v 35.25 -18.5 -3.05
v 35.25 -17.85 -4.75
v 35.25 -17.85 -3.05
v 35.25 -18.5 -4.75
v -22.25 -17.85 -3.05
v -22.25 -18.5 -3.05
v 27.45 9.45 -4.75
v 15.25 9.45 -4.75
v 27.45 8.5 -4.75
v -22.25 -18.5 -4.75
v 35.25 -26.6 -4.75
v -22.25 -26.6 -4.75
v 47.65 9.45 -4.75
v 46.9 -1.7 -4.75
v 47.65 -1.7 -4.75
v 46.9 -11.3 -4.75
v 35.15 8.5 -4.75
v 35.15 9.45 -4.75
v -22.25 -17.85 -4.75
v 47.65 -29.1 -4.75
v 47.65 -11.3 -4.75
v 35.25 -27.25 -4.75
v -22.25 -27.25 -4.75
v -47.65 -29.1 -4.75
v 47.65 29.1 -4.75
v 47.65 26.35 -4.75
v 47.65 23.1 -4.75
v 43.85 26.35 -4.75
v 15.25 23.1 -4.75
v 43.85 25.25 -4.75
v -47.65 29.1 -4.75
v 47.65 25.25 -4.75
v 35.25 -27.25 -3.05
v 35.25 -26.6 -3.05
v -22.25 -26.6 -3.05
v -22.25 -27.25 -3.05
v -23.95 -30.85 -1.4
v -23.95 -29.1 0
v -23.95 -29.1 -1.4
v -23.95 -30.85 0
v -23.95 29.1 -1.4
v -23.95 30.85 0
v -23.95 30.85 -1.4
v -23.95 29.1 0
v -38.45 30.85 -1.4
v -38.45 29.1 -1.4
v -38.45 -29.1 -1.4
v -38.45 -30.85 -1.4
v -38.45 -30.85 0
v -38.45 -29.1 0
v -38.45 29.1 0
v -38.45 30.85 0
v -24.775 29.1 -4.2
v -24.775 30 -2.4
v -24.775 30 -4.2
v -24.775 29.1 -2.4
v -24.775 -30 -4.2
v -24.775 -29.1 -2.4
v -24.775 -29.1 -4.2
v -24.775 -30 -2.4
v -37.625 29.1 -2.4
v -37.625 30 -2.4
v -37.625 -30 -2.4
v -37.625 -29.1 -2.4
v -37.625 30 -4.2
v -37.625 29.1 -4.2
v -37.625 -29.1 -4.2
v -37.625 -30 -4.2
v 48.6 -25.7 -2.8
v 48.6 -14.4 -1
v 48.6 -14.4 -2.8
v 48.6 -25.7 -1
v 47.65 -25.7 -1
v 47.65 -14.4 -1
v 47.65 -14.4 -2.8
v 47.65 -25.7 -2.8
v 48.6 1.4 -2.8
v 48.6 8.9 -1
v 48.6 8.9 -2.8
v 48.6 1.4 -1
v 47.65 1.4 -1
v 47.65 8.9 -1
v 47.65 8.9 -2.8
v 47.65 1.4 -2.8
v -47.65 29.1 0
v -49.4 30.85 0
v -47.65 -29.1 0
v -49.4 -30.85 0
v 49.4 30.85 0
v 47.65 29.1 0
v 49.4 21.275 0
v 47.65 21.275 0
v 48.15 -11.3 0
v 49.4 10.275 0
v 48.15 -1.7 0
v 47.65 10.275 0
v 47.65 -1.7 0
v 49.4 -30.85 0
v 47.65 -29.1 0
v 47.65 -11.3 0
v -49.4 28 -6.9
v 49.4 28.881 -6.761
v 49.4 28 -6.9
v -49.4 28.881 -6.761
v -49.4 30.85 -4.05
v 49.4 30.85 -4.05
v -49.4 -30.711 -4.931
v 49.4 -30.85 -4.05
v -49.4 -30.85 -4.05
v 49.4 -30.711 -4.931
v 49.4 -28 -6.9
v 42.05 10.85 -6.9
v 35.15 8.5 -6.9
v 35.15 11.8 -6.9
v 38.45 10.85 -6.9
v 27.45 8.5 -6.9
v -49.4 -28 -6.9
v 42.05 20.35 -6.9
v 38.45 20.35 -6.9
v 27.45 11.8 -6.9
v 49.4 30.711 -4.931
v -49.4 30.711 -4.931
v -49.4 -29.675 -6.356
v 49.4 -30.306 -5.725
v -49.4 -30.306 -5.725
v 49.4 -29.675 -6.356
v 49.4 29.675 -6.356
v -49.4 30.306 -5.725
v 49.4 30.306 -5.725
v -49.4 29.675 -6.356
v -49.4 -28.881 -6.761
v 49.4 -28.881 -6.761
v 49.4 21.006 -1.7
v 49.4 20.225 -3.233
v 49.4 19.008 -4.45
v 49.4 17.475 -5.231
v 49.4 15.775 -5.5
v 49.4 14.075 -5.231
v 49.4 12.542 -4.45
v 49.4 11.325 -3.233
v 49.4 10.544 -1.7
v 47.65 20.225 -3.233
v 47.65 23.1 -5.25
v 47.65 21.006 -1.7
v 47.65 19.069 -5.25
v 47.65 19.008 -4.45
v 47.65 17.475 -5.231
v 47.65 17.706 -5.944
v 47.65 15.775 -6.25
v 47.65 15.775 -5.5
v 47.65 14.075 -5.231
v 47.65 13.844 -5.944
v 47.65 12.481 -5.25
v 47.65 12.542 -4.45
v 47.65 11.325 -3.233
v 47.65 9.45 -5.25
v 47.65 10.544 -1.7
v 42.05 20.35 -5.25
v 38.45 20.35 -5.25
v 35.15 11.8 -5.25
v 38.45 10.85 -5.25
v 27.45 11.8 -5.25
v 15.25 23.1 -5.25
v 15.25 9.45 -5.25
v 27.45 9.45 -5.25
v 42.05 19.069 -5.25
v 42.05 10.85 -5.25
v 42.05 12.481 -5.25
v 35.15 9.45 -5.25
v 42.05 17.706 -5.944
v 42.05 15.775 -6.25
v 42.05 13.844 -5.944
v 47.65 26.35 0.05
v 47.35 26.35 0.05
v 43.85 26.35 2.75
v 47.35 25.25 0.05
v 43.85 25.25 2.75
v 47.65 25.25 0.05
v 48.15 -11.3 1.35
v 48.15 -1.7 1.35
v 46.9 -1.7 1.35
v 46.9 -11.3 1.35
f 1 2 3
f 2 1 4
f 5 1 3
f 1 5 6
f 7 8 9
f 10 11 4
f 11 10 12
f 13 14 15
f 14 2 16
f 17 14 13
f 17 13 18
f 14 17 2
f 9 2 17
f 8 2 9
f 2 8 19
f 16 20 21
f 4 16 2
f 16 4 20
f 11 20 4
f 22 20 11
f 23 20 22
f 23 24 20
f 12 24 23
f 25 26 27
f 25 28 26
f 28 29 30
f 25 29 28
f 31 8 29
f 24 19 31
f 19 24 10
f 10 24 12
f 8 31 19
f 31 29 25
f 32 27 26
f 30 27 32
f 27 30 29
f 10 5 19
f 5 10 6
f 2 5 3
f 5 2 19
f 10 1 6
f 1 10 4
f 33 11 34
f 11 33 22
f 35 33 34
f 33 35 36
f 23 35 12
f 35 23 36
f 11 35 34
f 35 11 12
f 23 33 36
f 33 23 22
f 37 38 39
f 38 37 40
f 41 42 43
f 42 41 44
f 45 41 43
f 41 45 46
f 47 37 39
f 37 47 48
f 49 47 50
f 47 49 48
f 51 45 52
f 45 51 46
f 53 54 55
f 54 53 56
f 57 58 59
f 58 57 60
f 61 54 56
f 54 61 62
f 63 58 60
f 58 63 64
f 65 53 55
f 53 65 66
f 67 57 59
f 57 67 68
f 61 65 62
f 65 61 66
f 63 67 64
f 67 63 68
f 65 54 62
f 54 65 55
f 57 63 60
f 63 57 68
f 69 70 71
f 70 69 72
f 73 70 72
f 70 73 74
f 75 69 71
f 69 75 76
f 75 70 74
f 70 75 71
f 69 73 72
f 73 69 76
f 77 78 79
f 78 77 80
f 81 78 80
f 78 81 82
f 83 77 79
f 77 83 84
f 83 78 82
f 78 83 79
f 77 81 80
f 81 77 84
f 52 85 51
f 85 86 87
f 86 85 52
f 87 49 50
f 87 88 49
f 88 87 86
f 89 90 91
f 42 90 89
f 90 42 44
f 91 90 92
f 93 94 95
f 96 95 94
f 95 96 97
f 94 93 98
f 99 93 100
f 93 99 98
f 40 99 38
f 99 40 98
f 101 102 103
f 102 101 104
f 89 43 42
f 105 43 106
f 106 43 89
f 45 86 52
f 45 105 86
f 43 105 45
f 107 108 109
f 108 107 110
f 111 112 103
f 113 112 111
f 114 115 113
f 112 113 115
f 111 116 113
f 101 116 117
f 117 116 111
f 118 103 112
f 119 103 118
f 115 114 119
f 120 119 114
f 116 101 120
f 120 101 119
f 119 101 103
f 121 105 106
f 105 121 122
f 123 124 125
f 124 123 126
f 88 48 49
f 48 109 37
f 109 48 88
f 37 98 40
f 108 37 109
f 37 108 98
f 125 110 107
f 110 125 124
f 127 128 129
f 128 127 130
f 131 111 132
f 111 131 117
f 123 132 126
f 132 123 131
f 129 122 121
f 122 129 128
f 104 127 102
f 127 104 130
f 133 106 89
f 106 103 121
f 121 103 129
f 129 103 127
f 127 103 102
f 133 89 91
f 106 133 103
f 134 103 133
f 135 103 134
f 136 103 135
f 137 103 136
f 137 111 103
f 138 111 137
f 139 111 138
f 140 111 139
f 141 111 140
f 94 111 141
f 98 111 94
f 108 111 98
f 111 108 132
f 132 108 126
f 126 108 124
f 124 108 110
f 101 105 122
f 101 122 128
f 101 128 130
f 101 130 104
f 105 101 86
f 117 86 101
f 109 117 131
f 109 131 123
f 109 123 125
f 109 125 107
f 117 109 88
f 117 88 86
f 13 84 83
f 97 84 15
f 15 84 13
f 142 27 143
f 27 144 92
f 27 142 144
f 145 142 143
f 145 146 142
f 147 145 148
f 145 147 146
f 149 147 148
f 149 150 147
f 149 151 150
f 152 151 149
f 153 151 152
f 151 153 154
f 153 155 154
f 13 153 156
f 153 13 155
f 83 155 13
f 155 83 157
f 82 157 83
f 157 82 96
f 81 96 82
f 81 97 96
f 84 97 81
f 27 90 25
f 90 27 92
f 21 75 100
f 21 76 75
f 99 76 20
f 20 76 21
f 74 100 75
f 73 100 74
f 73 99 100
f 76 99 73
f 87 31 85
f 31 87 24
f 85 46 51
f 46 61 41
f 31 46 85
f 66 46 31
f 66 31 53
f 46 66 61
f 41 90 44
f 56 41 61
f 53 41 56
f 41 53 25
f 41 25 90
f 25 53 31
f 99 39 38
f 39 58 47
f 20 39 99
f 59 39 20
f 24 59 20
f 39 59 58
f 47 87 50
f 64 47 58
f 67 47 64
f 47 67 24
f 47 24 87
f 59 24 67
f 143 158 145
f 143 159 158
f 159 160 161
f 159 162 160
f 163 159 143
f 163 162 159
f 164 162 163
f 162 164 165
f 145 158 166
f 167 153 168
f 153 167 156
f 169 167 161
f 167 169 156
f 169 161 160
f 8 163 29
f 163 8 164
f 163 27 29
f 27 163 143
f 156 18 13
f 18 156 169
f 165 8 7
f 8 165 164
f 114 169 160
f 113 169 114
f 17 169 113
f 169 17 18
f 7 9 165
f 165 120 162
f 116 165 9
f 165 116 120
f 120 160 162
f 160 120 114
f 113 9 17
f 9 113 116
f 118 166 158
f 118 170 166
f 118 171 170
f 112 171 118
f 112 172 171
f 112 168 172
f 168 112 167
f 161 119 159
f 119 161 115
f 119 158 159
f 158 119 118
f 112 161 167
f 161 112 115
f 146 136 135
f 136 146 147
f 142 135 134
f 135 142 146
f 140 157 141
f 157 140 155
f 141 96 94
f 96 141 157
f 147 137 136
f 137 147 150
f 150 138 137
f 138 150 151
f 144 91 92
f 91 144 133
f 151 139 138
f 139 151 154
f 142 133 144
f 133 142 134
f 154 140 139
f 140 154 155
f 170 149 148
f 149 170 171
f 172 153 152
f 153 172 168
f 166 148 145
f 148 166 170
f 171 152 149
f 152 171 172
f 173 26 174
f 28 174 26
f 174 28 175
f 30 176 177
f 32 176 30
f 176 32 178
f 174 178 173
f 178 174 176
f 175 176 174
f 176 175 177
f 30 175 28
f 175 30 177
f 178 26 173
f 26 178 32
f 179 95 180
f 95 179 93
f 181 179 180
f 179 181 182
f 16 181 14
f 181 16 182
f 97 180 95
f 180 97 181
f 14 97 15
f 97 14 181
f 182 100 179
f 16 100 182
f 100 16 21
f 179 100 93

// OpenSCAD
$fn=20;
fudge=0.1;

korgHousing();
module korgHousing(){
  wallThick=1.75;
  outerDims=[98.8,61.7,6.9];
  innerDims=[outerDims.x-wallThick*2,outerDims.y-wallThick*2,4.75];
  rad=2.85;
  hdJckRcsDims=[32.4,13.65,0.5];
  hdJckRcsPos=[(innerDims.x-hdJckRcsDims.x)/2,
               (innerDims.y-hdJckRcsDims.y)/2-6,
              -(innerDims.z+(hdJckRcsDims.z-fudge)/2)];
  hdJckLatchDims=[[7.7,3.3],[3.6,9.5]];
  shrkFinPoly=[[0,0],[0,7.5],[3.5,4.8],[3.8,4.8],[3.8,0]];
  batRipDims=[57.5,0.65,1.7];
  latchDims=[12.85,0.9,1.8];
  
  for (iy=[0,-(8.1+0.65)])
    translate([(innerDims.x-batRipDims.x)/2-12.4,
              -(innerDims.y-batRipDims.y)/2+10.6+iy,
              -innerDims.z+batRipDims.z/2]) cube(batRipDims,true);
  //Fin
  translate([innerDims.x/2-3.8,outerDims.y/2-4.5,-innerDims.z]) 
    rotate([90,0,0]) linear_extrude(1.1) polygon(shrkFinPoly);
  //latch
  translate([(outerDims.x-1.25)/2-1.25,(innerDims.y-9.6)/2-30.8,-innerDims.z+6.1/2]) 
    cube([1.25,9.6,6.1],true);
  //shell
  difference(){
    translate([0,0,-(outerDims.z-rad)]) rotate([90,0,90]) linear_extrude(outerDims.x,center=true){
      hull() for(ix=[-1,1])
        translate([ix*(outerDims.y/2-rad),0]) circle(rad);
        translate([-outerDims.y/2,0]) square([outerDims.y,outerDims.z-rad]);
    }
    translate([0,0,-(innerDims.z-fudge)/2]) cube(innerDims+[0,0,fudge],true);
    
    //headjack cutouts
    translate(hdJckRcsPos)
      cube(hdJckRcsDims+[0,0,fudge],true);
    translate([(innerDims.x-hdJckLatchDims[0].x)/2-12.5,
               (innerDims.y-hdJckLatchDims[0].y)/2-17.3,-(outerDims.z)/2-fudge]) 
      cube([hdJckLatchDims[0].x,hdJckLatchDims[0].y,outerDims.z+fudge],true);
    translate([(innerDims.x-hdJckLatchDims[1].x)/2-5.6,
               (innerDims.y-hdJckLatchDims[1].y)/2-8.75,-(outerDims.z)/2-fudge]) 
      cube([hdJckLatchDims[1].x,hdJckLatchDims[1].y,outerDims.z+fudge],true);
    
    
    translate([(innerDims.x-fudge)/2,hdJckRcsPos.y-0.5,0]) 
      rotate([0,90,0]) cylinder(d=11,h=wallThick+fudge);
    
    circRcsXPos=(innerDims.x-hdJckLatchDims[1].x)/2-5.6;
    
    translate([circRcsXPos,hdJckRcsPos.y-0.5,0]) 
      rotate([0,90,0])cylinder(d=12.5,h=innerDims.x/2-circRcsXPos);
    
    // locking
    // across
    translate([-(innerDims.x-14.5)/2+9.2,0,0]){
      translate([0,0,-(1.4-fudge)/2]) cube([14.5,outerDims.y+fudge,1.4+fudge],true);
      translate([0,0,-1.4-latchDims.z/2-1]) 
        cube([latchDims.x,innerDims.y+latchDims.y*2,latchDims.z],true);
    }
    // along
    translate([(innerDims.x+latchDims.y)/2,0,-latchDims.z/2-1]){
      translate([0,-(innerDims.y-11.3)/2+3.4,0]) 
        cube([latchDims.y+fudge,11.3,latchDims.z],true);
      translate([0,(innerDims.y-7.5)/2-20.2,0]) 
        cube([latchDims.y+fudge,7.5,latchDims.z],true);
    }
    
  }//difference
  
}
